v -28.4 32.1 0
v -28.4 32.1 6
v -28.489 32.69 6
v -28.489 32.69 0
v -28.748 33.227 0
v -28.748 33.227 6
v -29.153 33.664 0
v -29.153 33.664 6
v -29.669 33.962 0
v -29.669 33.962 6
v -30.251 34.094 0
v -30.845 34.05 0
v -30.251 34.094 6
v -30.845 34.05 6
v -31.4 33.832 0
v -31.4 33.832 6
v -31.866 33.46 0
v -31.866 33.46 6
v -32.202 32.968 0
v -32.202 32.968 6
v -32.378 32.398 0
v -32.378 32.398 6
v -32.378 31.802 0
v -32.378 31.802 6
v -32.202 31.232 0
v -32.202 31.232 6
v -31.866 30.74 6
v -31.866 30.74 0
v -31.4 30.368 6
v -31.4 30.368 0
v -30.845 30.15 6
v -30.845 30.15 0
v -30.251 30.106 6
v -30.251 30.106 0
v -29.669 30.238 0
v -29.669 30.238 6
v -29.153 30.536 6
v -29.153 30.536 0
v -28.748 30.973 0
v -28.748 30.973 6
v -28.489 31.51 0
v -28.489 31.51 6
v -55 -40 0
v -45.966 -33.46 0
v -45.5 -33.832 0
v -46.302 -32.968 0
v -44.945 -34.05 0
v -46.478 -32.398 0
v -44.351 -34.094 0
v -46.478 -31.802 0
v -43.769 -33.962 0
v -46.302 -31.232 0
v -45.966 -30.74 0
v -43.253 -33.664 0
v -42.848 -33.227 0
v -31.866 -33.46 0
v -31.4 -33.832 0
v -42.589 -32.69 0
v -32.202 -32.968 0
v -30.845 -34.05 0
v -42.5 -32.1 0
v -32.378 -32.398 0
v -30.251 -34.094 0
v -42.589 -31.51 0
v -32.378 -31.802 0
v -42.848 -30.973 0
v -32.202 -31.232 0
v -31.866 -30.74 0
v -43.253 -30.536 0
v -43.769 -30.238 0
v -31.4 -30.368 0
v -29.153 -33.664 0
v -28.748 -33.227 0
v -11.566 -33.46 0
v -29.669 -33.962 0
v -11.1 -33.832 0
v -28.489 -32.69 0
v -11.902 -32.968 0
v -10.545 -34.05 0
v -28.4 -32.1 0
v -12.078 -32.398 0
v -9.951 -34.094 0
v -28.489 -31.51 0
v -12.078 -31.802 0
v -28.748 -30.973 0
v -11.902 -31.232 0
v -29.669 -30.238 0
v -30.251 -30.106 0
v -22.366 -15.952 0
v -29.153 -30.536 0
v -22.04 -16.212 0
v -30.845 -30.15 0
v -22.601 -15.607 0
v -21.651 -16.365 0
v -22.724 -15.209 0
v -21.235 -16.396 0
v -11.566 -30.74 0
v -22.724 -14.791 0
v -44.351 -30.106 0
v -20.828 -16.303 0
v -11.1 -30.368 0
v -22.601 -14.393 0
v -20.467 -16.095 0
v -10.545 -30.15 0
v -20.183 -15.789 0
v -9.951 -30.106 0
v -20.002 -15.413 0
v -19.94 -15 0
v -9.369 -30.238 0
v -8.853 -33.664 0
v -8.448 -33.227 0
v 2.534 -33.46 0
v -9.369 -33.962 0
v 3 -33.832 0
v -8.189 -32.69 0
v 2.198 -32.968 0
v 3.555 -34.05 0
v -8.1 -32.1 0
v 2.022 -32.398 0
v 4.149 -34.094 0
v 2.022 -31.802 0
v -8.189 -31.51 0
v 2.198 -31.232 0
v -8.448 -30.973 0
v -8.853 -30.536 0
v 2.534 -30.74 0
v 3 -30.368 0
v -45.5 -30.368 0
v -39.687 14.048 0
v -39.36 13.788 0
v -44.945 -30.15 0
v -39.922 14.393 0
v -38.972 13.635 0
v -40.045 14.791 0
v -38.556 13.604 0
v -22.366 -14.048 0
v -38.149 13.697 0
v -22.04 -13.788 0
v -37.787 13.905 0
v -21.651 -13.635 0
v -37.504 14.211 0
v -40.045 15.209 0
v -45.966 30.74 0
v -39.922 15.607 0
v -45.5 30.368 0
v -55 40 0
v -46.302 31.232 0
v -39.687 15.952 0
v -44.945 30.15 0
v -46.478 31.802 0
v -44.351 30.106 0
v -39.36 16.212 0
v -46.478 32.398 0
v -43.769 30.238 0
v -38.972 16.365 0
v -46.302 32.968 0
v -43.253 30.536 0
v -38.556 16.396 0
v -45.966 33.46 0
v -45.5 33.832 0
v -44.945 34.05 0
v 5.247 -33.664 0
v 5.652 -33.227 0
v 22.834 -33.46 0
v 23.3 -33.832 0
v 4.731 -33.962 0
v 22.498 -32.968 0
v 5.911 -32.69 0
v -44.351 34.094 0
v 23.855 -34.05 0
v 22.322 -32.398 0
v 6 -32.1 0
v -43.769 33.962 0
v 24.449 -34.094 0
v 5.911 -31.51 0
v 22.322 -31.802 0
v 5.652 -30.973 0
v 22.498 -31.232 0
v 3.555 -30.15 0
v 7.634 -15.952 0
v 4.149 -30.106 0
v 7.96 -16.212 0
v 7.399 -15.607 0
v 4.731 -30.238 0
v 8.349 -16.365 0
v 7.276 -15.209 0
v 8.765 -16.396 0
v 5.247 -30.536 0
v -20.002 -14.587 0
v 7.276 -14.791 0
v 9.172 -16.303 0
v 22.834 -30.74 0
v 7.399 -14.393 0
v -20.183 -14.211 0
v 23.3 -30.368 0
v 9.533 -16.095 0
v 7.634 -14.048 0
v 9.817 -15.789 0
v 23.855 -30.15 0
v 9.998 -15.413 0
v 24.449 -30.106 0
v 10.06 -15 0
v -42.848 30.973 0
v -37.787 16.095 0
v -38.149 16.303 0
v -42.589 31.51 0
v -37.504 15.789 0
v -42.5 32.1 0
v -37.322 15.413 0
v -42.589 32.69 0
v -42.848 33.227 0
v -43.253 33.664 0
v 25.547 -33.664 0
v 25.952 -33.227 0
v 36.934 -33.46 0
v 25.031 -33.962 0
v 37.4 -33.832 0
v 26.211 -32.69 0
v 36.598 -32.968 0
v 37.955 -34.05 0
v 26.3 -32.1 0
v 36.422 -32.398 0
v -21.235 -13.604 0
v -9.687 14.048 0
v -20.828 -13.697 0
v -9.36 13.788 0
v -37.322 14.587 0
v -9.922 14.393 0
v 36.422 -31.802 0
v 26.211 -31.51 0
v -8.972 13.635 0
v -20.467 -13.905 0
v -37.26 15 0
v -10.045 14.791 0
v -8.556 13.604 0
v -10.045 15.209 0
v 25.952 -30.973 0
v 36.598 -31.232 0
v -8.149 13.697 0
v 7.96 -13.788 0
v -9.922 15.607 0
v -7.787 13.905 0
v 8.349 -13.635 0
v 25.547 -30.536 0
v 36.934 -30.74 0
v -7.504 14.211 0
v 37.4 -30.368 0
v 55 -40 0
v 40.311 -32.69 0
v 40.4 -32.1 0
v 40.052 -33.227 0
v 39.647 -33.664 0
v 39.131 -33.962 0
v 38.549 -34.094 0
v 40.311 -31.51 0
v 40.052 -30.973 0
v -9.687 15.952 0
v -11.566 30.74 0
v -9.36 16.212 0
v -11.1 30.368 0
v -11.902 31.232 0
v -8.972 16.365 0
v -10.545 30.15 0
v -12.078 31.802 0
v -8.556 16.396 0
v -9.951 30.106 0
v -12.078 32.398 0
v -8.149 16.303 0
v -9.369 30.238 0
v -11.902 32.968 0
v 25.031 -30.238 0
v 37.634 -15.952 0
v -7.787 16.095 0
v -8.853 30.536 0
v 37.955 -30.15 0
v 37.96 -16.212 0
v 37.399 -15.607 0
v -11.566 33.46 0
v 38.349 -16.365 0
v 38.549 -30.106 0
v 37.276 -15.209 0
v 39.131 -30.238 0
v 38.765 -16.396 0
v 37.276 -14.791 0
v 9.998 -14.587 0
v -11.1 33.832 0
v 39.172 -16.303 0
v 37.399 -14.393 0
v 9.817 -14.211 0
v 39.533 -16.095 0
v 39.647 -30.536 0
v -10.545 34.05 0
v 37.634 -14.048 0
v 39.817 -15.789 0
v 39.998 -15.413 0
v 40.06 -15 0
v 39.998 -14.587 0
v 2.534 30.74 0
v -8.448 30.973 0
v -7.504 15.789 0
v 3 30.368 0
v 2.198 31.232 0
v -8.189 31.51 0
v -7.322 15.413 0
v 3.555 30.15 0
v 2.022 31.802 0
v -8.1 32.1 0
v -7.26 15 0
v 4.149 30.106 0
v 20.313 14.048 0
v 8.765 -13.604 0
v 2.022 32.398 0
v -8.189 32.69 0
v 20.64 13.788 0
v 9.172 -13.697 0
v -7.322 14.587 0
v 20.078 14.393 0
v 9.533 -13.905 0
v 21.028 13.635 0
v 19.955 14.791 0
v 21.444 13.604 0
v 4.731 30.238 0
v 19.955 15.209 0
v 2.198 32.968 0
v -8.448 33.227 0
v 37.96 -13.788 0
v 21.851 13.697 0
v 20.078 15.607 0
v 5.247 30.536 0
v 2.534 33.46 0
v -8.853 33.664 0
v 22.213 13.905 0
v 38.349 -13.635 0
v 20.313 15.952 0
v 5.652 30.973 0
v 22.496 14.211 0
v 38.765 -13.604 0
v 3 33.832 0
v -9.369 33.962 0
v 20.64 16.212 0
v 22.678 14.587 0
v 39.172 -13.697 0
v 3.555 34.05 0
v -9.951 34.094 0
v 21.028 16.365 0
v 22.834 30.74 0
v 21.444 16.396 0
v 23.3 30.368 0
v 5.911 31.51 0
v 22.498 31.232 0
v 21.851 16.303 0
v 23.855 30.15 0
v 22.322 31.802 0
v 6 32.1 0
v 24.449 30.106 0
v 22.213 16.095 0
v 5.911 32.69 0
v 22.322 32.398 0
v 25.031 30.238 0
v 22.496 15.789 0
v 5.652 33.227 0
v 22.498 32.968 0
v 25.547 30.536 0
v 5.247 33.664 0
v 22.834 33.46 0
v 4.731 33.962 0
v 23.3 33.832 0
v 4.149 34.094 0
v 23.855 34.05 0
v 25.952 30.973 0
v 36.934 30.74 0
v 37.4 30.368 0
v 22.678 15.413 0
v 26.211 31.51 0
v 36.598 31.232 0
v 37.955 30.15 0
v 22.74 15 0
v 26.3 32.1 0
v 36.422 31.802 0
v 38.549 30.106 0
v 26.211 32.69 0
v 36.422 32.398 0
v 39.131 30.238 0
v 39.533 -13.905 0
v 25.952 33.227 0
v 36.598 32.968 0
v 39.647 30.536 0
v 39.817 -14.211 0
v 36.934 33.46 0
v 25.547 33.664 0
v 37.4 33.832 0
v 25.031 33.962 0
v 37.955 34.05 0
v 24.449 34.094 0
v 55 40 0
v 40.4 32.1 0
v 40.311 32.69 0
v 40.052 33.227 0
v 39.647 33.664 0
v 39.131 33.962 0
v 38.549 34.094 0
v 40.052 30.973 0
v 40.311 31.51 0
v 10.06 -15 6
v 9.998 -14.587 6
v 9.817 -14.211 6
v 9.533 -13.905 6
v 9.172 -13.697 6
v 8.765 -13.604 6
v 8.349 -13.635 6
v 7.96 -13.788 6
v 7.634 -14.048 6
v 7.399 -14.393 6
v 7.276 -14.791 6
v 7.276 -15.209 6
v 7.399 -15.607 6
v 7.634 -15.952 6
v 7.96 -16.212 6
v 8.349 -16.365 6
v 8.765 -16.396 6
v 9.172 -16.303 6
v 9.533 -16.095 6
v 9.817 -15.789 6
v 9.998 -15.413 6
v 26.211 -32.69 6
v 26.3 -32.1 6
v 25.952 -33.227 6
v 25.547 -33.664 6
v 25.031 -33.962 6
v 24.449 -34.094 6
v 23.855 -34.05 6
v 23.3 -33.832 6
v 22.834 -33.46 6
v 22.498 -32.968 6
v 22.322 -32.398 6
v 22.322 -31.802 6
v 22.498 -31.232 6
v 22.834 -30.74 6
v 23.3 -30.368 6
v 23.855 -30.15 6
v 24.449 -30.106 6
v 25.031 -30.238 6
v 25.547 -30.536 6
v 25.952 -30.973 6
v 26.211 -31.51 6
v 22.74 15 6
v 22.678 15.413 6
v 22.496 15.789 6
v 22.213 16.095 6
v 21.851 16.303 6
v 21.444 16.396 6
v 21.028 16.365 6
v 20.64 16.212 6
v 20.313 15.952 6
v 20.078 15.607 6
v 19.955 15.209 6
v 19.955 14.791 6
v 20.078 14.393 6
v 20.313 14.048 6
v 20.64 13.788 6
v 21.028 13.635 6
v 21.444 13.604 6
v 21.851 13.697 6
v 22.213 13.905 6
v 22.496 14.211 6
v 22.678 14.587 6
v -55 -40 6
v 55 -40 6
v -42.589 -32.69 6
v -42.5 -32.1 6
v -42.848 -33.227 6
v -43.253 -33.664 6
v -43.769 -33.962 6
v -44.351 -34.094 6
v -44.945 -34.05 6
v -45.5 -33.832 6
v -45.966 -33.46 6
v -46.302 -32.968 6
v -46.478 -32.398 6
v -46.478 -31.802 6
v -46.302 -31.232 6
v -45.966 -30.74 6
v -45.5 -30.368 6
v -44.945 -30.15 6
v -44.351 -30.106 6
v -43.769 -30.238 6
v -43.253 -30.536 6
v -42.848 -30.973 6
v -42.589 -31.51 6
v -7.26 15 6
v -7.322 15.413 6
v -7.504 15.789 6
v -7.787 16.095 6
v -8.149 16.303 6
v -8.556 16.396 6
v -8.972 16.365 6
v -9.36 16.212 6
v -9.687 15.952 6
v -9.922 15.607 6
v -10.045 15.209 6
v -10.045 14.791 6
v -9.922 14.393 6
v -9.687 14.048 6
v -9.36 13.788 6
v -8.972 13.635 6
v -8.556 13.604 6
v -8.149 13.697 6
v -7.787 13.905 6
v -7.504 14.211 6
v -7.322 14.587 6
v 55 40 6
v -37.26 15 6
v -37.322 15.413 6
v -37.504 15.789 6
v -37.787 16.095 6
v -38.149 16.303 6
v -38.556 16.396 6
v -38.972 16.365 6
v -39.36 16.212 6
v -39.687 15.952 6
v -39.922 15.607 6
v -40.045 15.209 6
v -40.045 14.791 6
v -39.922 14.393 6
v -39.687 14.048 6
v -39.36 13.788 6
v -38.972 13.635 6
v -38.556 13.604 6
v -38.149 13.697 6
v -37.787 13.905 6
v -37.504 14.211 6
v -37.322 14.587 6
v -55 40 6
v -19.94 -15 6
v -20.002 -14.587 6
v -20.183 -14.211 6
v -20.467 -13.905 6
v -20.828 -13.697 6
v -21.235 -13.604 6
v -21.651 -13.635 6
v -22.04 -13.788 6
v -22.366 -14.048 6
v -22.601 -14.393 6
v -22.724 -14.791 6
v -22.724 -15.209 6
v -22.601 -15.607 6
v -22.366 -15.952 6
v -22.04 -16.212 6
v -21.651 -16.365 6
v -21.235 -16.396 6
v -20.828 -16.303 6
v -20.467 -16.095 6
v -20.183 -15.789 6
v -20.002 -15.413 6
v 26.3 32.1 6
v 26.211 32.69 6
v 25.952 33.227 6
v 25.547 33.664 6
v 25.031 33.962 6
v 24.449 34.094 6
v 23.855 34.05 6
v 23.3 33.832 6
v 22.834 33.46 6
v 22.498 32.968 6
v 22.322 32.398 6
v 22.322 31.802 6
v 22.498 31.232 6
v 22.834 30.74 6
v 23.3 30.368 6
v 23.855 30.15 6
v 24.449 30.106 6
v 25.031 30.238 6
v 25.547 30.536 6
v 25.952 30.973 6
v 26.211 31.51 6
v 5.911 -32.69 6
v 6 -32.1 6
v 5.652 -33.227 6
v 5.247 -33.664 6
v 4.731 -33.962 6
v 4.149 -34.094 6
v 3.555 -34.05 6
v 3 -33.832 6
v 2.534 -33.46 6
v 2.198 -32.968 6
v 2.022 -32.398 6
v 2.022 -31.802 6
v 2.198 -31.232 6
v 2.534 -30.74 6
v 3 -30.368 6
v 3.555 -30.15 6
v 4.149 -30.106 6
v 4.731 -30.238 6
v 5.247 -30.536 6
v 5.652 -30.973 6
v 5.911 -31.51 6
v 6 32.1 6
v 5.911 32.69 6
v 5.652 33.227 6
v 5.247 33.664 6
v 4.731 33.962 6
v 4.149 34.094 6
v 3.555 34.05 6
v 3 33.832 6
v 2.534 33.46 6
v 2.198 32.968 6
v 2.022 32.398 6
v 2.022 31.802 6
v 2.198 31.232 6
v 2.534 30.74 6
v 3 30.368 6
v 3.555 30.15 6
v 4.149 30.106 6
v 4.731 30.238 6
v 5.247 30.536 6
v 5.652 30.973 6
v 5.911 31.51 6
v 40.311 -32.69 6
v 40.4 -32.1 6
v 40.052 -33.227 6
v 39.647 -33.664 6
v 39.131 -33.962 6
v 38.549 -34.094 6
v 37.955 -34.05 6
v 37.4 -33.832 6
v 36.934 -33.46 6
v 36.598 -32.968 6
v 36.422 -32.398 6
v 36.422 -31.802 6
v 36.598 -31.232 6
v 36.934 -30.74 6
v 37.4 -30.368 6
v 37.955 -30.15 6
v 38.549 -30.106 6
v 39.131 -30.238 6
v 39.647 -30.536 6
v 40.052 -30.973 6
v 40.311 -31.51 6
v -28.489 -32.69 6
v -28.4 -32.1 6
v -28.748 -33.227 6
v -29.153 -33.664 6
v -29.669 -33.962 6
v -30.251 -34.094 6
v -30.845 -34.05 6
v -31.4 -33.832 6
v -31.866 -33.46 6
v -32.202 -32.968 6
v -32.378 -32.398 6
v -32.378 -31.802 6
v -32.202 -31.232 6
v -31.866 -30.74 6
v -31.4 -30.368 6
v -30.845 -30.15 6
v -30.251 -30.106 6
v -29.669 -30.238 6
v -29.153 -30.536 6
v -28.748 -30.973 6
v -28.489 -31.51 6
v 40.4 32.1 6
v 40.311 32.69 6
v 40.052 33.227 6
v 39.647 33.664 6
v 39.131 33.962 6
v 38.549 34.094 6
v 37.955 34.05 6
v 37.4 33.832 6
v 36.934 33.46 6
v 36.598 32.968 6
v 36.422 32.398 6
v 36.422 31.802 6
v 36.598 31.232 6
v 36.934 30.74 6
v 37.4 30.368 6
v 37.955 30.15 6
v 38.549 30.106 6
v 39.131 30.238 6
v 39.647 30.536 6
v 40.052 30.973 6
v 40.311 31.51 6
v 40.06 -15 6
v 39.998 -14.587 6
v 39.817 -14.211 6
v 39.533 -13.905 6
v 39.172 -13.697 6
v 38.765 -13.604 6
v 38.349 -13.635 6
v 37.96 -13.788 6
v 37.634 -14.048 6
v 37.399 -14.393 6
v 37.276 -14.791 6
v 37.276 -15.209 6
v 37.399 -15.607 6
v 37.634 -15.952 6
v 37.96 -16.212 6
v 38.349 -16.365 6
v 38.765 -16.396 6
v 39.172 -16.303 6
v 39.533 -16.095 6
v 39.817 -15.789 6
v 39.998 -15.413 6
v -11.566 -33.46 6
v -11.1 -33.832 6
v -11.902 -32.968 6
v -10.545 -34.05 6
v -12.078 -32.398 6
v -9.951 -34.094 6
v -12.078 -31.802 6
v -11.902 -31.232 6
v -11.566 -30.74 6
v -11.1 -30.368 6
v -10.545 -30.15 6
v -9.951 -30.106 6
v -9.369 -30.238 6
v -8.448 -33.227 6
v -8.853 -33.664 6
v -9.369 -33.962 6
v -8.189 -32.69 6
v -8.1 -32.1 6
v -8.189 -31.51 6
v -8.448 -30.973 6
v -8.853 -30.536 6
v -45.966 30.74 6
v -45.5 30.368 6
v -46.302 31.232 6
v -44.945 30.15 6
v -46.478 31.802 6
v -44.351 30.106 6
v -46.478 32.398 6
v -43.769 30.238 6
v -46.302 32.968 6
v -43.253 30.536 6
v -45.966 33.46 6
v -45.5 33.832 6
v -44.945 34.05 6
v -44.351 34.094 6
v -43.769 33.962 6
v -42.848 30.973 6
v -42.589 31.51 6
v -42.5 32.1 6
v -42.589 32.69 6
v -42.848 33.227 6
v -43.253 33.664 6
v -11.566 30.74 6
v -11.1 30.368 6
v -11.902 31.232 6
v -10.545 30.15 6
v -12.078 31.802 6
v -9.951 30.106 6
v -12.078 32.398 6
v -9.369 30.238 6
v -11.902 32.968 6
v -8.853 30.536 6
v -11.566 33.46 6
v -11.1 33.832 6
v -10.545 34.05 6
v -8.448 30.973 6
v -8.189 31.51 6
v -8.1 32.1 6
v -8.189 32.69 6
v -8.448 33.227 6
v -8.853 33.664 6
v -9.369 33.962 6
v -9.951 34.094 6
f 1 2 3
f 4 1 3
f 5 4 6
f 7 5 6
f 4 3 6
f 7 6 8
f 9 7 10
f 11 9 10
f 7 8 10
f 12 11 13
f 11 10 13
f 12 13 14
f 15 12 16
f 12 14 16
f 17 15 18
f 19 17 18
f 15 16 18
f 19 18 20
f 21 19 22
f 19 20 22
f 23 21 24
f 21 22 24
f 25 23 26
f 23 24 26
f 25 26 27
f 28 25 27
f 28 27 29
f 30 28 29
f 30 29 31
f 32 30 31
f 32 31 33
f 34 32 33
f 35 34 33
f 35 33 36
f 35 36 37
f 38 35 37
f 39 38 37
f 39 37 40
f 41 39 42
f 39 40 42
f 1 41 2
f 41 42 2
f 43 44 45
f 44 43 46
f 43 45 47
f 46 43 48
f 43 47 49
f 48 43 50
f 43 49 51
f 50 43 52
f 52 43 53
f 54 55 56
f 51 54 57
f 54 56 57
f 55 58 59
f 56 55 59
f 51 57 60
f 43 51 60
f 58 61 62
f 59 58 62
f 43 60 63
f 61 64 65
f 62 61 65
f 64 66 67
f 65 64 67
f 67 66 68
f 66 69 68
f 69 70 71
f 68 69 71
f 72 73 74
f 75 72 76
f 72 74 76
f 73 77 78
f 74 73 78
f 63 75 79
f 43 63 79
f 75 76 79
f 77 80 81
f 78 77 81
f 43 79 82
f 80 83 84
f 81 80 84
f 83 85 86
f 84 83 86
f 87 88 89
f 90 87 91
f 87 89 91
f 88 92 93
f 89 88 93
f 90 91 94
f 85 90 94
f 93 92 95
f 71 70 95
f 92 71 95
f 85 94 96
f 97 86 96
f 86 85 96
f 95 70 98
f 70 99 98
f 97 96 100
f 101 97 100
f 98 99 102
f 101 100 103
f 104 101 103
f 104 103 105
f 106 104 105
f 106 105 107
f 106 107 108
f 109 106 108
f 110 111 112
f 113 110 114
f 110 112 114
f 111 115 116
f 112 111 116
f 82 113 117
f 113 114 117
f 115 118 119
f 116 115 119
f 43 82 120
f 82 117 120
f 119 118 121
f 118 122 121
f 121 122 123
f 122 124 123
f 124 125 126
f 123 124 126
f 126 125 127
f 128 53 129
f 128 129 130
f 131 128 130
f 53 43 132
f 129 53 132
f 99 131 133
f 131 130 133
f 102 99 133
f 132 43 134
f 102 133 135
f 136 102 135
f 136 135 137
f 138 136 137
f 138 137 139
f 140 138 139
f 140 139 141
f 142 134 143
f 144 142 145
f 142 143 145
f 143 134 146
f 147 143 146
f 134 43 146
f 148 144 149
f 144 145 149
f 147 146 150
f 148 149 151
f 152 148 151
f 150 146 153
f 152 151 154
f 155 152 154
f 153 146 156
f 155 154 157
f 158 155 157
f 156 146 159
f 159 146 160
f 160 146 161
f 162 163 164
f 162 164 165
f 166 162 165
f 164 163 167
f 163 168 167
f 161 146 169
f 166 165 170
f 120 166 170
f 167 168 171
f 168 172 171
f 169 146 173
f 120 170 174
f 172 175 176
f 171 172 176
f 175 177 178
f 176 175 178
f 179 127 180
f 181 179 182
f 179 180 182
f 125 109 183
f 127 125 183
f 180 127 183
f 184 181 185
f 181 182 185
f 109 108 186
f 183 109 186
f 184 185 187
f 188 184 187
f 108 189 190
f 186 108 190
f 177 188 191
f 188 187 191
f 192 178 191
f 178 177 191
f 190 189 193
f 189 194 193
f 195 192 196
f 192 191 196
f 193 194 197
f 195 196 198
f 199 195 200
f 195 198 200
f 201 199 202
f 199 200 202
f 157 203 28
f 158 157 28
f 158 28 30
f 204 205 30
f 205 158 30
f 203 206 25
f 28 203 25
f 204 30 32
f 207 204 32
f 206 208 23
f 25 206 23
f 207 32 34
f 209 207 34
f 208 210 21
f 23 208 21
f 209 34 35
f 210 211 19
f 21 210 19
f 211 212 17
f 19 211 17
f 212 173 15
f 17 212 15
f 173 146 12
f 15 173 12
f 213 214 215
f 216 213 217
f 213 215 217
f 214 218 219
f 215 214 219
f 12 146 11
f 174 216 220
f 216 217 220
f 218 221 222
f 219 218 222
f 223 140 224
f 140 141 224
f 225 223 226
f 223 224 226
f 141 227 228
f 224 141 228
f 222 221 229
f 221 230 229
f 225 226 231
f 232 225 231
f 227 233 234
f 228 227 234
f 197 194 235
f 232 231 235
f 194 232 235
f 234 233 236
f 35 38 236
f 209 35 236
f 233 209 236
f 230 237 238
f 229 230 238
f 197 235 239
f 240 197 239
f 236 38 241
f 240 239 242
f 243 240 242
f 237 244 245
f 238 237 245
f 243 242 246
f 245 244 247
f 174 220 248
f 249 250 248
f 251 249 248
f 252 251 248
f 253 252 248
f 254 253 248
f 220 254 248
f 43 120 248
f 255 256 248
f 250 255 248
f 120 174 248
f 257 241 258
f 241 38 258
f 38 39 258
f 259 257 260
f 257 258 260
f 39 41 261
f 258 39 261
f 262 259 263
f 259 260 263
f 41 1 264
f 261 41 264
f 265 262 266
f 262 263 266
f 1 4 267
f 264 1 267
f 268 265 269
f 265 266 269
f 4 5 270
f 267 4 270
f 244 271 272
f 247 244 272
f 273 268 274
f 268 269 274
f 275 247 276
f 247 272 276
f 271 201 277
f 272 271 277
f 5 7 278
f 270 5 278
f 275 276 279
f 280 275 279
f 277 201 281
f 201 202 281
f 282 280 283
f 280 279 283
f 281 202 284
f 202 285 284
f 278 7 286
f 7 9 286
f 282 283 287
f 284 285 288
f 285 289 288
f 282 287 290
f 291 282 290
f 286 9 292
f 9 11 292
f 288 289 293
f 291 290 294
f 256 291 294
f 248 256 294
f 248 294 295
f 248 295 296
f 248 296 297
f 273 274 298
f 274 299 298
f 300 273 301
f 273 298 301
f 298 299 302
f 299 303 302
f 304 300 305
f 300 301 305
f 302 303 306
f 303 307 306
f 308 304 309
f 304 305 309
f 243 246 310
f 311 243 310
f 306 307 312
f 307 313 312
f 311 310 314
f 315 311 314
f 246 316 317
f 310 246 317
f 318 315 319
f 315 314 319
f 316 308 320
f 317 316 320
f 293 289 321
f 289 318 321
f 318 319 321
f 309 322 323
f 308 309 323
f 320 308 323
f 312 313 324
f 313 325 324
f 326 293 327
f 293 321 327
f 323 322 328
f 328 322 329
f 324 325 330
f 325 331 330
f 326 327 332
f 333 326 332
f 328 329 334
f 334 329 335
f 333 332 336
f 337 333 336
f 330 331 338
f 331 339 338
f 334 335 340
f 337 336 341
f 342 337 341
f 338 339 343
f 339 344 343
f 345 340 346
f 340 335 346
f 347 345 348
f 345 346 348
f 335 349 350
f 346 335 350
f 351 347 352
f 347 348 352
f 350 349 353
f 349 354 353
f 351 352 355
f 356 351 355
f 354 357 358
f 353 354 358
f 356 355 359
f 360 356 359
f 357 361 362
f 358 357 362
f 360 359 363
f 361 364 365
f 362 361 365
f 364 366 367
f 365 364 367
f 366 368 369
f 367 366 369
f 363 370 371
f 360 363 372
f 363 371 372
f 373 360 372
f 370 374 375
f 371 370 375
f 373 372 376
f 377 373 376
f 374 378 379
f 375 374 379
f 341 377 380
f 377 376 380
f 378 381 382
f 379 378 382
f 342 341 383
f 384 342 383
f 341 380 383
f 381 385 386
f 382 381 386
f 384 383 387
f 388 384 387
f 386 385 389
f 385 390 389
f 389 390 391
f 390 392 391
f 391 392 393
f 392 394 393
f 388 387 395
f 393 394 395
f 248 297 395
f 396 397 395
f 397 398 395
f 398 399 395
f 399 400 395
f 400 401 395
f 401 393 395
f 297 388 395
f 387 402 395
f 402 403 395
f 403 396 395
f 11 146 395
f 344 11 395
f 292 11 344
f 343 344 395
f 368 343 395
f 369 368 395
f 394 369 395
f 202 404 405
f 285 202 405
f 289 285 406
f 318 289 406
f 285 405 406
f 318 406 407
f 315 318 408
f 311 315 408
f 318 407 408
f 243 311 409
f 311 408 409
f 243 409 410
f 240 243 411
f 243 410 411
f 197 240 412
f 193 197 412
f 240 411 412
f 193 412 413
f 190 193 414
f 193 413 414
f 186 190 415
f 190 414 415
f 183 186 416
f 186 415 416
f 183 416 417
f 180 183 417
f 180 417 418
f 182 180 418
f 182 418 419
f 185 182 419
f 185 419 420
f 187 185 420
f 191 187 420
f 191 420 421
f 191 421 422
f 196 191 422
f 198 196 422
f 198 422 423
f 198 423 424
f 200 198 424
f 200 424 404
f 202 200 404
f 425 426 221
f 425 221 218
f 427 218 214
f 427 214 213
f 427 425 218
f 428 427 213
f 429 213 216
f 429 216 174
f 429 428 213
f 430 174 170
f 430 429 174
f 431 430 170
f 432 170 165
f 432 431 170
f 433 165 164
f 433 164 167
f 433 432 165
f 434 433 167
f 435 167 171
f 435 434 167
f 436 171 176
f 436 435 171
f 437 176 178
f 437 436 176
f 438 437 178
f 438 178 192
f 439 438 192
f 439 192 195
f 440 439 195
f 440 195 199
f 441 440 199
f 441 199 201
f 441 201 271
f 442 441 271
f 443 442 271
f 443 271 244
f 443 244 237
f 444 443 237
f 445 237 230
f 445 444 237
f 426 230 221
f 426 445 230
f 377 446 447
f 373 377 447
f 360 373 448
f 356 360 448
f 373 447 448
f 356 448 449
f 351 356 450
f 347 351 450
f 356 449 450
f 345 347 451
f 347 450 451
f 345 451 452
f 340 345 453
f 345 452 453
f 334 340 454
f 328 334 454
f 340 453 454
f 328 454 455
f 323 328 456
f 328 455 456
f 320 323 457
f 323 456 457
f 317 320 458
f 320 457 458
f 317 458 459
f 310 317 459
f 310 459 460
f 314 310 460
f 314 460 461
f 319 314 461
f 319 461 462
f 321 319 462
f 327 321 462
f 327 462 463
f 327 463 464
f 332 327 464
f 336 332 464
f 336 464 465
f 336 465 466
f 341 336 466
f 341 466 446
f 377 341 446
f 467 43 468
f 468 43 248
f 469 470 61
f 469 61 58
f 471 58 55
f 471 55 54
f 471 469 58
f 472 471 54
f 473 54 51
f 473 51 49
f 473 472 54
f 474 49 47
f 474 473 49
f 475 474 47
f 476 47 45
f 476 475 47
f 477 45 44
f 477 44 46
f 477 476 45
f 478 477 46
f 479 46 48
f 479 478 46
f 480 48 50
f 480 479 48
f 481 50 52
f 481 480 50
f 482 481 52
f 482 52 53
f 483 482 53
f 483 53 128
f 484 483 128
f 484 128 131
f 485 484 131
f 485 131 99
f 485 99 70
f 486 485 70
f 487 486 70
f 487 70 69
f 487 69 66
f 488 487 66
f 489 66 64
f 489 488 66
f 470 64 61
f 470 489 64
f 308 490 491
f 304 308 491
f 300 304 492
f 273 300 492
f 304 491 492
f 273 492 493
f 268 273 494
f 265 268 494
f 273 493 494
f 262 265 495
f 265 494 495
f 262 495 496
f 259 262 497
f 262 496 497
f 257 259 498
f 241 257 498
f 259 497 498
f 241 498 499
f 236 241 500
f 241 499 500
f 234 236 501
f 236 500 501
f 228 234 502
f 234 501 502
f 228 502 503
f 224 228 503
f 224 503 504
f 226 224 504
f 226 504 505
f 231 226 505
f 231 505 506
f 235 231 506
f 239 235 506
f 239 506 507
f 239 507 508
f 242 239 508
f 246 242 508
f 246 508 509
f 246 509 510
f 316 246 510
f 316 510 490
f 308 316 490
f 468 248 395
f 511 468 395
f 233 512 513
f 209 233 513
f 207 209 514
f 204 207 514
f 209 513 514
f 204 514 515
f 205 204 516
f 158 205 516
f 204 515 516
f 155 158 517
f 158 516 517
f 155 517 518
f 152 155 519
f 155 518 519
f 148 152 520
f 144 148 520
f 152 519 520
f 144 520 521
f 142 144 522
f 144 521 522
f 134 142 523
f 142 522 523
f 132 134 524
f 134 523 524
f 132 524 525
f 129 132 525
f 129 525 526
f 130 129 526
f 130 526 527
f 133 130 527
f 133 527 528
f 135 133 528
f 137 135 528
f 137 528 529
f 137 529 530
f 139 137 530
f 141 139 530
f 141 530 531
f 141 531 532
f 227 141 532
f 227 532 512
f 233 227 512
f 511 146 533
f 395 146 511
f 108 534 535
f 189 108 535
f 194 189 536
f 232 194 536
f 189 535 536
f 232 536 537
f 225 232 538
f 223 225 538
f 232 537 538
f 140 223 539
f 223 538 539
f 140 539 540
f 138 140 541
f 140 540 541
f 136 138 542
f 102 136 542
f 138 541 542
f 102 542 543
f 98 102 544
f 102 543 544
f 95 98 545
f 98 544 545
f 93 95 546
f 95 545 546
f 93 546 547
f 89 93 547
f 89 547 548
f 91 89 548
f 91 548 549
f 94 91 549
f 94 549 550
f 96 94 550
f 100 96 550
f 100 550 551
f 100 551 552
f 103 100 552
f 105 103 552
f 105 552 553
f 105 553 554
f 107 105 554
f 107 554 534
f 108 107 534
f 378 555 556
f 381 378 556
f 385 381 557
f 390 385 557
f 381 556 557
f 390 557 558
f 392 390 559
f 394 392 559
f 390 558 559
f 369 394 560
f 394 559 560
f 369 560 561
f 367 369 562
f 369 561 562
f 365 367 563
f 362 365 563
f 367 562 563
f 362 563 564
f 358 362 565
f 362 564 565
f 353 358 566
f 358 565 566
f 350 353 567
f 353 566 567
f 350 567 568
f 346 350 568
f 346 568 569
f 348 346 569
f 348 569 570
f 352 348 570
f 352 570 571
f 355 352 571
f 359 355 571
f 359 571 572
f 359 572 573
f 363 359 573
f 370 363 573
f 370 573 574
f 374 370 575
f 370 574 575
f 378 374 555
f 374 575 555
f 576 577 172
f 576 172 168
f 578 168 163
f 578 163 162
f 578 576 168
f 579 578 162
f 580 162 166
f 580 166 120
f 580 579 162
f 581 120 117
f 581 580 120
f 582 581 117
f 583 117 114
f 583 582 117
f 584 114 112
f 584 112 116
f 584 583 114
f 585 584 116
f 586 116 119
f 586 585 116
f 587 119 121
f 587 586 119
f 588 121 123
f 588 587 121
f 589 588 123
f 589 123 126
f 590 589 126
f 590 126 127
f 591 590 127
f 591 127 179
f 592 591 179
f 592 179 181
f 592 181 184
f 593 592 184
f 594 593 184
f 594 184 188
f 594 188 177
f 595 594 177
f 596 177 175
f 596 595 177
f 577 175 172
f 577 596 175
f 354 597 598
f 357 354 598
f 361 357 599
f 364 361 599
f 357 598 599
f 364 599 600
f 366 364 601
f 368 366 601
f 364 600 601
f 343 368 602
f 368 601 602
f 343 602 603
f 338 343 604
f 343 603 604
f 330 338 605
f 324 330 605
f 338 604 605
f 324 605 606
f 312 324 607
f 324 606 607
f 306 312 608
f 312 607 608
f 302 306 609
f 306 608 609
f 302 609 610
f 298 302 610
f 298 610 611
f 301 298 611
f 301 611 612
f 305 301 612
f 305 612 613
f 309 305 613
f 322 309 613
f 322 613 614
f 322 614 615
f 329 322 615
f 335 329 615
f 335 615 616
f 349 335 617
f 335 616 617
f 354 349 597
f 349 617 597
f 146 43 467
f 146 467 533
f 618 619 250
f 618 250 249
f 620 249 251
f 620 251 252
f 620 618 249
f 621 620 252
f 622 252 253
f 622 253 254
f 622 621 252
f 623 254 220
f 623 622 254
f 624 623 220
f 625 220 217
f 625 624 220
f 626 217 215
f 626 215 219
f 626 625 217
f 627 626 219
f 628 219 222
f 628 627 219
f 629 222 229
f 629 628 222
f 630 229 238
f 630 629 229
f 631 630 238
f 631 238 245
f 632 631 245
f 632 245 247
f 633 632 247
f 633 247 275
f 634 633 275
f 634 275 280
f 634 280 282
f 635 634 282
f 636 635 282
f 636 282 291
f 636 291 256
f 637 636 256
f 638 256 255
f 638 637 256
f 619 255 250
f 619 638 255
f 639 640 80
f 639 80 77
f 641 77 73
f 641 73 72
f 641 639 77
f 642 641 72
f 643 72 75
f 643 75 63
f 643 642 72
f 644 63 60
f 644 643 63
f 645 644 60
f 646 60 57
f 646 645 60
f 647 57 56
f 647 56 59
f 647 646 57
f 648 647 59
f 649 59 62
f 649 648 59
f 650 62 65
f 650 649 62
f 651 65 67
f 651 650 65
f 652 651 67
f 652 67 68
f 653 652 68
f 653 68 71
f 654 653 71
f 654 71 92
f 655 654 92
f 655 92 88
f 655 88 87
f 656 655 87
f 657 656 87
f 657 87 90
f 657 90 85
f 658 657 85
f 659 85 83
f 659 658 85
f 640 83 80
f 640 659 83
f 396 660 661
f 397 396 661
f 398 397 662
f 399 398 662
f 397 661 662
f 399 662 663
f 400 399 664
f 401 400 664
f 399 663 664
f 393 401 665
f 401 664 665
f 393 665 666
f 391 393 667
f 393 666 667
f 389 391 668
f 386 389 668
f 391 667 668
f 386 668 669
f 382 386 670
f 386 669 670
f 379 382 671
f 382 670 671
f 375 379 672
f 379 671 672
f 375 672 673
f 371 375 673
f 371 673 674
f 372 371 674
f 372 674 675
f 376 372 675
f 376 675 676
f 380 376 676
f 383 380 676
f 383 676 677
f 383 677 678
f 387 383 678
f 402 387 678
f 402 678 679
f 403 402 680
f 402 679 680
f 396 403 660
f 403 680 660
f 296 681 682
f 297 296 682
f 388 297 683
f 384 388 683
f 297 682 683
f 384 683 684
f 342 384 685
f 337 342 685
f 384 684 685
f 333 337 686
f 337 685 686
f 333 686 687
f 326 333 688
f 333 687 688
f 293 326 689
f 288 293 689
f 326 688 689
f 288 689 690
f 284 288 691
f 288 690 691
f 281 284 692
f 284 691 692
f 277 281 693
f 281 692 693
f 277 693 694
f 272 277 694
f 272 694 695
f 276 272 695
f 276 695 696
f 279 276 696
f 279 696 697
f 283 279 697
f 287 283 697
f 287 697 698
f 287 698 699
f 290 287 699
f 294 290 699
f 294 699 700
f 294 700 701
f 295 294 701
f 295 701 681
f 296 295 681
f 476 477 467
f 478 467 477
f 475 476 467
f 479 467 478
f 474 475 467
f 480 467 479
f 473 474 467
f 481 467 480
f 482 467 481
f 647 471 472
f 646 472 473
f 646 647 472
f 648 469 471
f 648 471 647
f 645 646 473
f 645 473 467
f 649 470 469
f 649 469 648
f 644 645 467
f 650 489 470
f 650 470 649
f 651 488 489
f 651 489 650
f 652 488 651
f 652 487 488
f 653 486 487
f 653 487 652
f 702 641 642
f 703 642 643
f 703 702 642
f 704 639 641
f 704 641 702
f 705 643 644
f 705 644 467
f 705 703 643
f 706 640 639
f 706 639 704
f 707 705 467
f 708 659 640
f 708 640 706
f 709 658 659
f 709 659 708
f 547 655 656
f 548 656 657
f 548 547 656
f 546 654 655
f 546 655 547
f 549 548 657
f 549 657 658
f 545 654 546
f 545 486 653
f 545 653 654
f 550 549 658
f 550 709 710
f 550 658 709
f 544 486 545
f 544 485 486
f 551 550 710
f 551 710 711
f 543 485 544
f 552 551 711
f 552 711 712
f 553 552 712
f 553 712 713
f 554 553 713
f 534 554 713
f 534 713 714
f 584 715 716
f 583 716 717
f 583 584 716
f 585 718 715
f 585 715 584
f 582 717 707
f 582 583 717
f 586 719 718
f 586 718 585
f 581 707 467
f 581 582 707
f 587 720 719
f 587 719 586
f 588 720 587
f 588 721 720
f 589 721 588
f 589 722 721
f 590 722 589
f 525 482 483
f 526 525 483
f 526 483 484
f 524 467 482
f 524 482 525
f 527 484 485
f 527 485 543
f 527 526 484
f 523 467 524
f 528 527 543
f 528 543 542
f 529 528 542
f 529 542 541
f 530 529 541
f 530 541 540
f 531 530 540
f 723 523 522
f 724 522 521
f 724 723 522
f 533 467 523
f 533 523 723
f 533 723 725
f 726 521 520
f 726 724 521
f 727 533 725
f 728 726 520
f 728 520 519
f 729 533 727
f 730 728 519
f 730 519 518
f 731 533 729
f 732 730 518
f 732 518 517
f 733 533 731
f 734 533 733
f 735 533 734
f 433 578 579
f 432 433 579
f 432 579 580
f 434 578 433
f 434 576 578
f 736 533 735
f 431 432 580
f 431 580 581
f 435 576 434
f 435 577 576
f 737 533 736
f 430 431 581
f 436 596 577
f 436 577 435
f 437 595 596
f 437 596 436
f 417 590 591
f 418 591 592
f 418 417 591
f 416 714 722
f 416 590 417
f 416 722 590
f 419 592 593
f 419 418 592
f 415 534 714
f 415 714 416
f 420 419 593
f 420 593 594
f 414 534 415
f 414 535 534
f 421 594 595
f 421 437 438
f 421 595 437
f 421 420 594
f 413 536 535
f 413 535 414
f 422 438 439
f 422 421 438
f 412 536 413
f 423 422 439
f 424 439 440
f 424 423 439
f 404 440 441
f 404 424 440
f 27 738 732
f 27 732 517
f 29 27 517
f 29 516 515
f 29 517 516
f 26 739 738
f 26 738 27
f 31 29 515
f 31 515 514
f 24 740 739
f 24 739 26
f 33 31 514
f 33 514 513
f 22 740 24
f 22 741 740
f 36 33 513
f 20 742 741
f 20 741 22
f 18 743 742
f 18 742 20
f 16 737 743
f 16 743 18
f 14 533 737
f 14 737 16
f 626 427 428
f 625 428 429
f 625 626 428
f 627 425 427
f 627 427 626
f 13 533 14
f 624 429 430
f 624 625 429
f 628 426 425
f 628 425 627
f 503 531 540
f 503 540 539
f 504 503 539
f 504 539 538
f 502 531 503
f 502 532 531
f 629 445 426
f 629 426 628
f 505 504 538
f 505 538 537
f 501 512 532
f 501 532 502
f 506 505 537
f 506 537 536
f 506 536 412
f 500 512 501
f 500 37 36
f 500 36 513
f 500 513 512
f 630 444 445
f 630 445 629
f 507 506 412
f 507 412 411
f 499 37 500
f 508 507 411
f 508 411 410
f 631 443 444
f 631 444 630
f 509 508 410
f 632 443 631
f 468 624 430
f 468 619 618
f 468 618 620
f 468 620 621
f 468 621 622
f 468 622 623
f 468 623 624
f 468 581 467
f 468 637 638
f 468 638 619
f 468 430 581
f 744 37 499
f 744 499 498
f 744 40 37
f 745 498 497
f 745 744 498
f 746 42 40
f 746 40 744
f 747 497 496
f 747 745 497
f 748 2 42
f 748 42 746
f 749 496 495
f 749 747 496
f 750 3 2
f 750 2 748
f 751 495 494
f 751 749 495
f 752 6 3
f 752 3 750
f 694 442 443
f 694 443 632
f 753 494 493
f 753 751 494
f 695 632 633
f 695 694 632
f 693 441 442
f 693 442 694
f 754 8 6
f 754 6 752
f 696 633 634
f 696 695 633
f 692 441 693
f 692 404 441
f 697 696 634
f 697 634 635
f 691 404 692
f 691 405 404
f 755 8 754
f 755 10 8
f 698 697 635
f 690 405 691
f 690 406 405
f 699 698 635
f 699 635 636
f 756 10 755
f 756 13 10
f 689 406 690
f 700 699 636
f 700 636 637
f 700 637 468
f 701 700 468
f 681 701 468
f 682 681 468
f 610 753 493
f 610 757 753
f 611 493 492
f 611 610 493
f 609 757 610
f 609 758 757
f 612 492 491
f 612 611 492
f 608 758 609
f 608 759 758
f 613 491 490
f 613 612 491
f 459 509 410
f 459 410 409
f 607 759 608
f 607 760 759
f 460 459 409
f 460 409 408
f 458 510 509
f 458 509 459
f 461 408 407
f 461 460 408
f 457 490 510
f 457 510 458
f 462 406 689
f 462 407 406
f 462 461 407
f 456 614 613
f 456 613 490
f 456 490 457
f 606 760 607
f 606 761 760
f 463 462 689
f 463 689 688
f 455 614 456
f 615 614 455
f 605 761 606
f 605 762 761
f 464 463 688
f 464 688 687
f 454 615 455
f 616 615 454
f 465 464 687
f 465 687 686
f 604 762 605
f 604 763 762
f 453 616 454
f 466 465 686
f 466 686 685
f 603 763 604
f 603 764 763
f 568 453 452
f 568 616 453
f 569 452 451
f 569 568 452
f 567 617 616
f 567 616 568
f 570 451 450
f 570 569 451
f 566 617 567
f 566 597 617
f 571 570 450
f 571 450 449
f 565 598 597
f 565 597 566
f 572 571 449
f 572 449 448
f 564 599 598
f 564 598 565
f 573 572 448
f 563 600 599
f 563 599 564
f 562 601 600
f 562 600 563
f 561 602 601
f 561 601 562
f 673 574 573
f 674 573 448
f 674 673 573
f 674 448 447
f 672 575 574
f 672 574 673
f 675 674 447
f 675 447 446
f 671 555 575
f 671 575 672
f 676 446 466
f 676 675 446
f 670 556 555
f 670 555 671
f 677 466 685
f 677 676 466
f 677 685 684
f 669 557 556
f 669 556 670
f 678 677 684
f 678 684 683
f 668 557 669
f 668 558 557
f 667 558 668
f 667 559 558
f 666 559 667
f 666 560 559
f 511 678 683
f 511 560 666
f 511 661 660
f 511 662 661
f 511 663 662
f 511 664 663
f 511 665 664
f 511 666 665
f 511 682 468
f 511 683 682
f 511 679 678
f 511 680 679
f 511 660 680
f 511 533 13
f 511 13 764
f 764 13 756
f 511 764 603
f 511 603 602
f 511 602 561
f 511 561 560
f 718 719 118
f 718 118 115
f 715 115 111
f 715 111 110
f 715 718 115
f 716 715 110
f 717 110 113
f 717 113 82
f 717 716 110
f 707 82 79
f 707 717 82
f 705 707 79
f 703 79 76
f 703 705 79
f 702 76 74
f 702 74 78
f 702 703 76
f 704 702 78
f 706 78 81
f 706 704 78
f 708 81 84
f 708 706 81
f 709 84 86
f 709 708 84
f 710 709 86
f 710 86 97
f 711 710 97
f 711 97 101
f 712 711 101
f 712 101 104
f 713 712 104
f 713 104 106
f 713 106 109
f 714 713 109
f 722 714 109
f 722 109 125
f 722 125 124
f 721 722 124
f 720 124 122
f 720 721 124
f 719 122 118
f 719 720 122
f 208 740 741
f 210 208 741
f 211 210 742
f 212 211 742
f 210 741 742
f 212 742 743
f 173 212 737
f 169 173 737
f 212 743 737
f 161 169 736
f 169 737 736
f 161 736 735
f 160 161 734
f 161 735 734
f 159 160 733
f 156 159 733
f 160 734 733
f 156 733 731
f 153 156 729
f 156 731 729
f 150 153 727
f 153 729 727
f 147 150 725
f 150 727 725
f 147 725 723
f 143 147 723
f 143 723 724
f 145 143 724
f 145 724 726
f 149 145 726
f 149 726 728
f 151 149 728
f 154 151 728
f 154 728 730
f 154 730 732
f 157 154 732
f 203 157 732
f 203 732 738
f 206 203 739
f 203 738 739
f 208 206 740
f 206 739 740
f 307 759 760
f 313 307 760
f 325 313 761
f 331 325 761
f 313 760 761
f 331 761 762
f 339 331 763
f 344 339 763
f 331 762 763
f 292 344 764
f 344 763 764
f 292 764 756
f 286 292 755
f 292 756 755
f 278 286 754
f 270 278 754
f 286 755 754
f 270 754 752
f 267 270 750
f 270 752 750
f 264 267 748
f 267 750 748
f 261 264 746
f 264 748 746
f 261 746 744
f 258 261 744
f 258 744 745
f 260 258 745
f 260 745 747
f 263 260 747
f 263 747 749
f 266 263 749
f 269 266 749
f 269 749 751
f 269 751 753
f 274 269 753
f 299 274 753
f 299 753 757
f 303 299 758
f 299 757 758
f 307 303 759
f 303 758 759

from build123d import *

# Parameters (mm, degrees)
SKETCH_W        = 110
SKETCH_H        = 80
PAD_DEPTH       = 6
SKETCH001_R     = 1.4
POCKET_DEPTH    = 8
SKETCH002_R     = 2
POCKET001_DEPTH = 6


with BuildPart() as part:
    # Sketch → Pad (new body)
    with BuildSketch(Plane.XY):
        Rectangle(SKETCH_W, SKETCH_H)
    extrude(amount=PAD_DEPTH)

    # Sketch001 → Pocket (cut)
    with BuildSketch(Plane.XY.offset(6)):
        with Locations((-38.660252, 15)):
            Circle(SKETCH001_R)
        with Locations((-21.339748, -15)):
            Circle(SKETCH001_R)
        with Locations((-8.660252, 15)):
            Circle(SKETCH001_R)
        with Locations((8.660252, -15)):
            Circle(SKETCH001_R)
        with Locations((21.339748, 15)):
            Circle(SKETCH001_R)
        with Locations((38.660252, -15)):
            Circle(SKETCH001_R)
    extrude(amount=-POCKET_DEPTH, mode=Mode.SUBTRACT)

    # Sketch002 → Pocket001 (cut)
    with BuildSketch(Plane.XY.offset(6)):
        with Locations((-44.5, 32.1)):
            Circle(SKETCH002_R)
        with Locations((38.4, 32.1)):
            Circle(SKETCH002_R)
        with Locations((-30.4, 32.1)):
            Circle(SKETCH002_R)
        with Locations((-10.1, 32.1)):
            Circle(SKETCH002_R)
        with Locations((24.3, 32.1)):
            Circle(SKETCH002_R)
        with Locations((4, 32.1)):
            Circle(SKETCH002_R)
    pocket001 = extrude(amount=-POCKET001_DEPTH, mode=Mode.SUBTRACT)

    # Mirrored: Pocket001 across Sketch002 H_Axis
    add(pocket001.mirror(Plane(origin=(0, 0, 6), x_dir=(0, 0, 1), z_dir=(0, 1, 0))), mode=Mode.SUBTRACT)


solid = part.part
